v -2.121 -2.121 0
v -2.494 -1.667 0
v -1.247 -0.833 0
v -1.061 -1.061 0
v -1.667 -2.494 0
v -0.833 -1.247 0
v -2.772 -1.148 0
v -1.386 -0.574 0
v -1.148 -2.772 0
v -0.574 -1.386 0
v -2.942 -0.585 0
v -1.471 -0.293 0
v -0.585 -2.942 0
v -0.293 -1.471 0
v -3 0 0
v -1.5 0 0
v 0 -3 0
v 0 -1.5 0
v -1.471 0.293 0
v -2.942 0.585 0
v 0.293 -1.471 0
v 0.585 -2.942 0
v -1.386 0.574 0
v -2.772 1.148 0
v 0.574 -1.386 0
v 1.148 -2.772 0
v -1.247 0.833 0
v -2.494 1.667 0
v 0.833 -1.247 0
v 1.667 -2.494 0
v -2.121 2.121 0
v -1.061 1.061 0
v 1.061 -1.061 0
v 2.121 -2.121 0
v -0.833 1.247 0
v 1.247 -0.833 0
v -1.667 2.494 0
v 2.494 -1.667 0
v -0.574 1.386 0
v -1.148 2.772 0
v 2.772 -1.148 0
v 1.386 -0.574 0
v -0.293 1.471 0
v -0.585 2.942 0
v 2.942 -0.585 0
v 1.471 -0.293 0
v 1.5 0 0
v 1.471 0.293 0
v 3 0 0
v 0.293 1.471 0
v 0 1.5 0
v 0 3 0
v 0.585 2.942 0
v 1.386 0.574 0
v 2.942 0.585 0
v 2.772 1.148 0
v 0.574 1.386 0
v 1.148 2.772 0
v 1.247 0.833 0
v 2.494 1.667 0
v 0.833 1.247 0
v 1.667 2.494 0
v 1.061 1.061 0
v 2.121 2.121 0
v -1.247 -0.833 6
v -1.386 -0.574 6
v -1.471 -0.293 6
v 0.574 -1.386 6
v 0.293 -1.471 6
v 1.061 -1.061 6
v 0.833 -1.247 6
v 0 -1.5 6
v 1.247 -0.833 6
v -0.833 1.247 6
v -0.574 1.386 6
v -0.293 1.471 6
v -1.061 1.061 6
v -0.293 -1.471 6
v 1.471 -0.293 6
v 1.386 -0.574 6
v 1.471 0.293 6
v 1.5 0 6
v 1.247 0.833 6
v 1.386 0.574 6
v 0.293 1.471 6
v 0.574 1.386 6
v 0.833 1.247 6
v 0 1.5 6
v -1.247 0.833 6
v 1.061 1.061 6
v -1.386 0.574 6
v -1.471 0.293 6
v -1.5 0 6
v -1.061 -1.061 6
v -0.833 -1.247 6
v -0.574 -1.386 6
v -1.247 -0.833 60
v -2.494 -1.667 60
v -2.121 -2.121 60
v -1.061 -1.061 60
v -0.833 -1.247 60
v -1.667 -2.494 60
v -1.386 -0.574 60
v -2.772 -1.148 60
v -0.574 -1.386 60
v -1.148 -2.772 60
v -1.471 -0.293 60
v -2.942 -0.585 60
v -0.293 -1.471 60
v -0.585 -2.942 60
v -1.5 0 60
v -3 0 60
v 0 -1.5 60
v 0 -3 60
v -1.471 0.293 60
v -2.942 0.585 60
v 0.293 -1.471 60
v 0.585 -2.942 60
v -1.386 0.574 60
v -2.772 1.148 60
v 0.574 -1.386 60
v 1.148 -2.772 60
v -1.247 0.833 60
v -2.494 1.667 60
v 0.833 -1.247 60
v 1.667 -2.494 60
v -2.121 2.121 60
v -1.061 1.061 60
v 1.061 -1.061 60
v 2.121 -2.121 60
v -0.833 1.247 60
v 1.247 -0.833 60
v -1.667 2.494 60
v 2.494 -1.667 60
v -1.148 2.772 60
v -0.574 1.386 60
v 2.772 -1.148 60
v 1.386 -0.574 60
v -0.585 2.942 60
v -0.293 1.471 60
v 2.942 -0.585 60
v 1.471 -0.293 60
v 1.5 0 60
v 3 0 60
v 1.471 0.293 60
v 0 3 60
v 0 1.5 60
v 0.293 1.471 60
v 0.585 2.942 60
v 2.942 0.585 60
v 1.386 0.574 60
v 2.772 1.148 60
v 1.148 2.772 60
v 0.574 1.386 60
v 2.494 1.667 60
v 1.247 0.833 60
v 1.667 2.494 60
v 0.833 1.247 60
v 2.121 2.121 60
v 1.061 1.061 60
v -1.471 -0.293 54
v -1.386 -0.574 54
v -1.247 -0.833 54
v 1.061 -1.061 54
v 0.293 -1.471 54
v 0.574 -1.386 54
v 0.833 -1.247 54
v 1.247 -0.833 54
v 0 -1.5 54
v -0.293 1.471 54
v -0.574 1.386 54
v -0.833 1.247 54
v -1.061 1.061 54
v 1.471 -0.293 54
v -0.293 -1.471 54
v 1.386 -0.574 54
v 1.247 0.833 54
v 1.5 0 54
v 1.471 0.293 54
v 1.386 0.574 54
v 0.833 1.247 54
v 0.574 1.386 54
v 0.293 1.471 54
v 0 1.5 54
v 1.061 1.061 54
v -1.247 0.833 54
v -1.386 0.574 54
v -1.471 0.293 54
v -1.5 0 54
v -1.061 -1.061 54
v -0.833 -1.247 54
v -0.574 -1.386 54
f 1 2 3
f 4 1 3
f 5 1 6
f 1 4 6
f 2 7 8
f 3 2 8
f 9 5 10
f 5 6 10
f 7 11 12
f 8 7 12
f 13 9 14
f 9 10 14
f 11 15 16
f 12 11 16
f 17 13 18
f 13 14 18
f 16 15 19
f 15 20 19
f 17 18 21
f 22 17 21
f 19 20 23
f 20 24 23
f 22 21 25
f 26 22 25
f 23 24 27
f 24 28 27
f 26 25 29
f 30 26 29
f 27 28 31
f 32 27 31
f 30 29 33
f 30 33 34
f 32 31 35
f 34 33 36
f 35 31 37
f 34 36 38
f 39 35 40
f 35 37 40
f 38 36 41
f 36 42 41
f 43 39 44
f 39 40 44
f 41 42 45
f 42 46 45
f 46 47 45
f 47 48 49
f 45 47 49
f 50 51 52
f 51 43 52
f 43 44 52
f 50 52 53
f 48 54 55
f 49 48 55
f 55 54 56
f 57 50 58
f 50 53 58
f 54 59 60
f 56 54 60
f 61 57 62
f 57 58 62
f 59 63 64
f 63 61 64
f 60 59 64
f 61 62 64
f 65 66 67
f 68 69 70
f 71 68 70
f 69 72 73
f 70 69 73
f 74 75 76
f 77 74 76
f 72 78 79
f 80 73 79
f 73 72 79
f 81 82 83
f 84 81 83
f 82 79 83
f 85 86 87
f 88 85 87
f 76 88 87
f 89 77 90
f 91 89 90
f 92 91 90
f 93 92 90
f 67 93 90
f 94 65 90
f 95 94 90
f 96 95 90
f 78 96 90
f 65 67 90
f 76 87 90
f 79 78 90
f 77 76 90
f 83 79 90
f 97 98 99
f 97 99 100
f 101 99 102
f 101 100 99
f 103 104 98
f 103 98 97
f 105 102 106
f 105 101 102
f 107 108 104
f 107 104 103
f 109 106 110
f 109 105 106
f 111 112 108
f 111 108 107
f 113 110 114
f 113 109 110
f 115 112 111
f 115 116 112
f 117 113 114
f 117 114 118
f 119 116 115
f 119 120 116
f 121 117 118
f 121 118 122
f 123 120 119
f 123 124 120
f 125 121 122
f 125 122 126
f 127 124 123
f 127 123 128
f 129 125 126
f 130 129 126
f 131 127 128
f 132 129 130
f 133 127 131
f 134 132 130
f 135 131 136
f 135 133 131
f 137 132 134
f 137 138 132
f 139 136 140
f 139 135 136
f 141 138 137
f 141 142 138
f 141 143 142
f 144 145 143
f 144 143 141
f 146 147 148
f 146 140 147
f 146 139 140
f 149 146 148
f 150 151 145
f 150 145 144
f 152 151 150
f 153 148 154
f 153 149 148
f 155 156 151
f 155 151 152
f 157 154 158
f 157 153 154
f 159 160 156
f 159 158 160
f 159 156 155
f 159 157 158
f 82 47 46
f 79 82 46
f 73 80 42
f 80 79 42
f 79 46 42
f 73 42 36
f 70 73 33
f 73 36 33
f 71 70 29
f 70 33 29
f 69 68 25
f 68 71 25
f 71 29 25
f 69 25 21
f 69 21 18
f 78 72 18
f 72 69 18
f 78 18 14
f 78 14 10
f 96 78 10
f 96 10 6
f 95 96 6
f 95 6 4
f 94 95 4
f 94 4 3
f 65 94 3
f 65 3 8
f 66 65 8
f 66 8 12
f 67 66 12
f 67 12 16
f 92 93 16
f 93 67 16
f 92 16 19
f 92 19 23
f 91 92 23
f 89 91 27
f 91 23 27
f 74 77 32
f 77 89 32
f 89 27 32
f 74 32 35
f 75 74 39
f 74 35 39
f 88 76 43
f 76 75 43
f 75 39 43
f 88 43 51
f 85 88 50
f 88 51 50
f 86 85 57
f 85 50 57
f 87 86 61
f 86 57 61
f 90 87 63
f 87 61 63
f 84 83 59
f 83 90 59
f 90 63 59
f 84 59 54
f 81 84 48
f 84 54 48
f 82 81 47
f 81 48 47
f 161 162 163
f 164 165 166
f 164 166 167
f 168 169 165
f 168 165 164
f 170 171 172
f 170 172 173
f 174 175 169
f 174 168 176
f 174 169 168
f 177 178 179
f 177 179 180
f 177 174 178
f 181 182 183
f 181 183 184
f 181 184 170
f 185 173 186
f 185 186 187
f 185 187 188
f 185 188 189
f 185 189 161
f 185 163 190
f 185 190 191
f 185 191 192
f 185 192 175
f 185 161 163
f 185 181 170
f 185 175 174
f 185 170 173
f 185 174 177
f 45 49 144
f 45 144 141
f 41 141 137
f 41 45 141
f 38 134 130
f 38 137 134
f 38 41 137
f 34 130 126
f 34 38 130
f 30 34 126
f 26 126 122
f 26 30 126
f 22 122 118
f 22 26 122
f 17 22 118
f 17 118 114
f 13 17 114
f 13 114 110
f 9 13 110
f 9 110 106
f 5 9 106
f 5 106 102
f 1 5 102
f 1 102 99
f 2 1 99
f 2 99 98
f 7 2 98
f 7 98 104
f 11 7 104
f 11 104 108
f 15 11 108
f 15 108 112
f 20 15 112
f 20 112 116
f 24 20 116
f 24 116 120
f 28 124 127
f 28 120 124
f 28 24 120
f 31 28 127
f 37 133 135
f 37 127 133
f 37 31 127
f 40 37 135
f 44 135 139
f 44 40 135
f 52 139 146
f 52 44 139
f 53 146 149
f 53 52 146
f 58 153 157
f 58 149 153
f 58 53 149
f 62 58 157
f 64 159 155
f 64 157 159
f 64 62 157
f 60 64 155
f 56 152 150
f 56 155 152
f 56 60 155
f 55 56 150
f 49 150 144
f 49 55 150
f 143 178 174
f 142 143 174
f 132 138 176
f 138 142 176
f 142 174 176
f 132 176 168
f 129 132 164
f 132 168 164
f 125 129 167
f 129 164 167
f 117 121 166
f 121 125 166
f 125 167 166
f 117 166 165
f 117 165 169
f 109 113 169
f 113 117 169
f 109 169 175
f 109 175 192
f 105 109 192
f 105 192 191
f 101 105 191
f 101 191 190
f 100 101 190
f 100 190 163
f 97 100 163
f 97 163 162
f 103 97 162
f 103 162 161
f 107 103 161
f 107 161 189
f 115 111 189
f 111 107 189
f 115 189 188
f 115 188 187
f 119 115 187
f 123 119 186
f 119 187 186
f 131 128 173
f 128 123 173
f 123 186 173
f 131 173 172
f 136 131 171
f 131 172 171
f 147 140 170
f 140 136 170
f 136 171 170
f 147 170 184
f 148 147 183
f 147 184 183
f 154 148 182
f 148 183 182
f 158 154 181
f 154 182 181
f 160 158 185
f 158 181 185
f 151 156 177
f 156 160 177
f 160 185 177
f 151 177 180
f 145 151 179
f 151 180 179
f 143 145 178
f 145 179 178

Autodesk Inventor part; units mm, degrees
ref_plane "YZ Plane" through (0, 0, 0) normal (1, 0, 0) x (0, 1, 0)
ref_plane "XZ Plane" through (0, 0, 0) normal (0, 1, 0) x (-1, 0, 0)
sketch "スケッチ1" plane through (0, 0, 0) normal (0, 0, 1) x (1, 0, 0)
  circle A0 centre (0, 0) radius 3
  circle A1 centre (0, 0) radius 1.5
  dimension "d0" = 6
  dimension "d1" = 3
extrude "押し出し1" add sketch "スケッチ1" along normal blind 60
sketch "スケッチ2" plane through (0, 0, 60) normal (0, 0, 1) x (1, 0, 0)
  point P0 (0, 0)
ref_plane "作業平面1" through (0, 0, 54) normal (0, 0, 1) x (1, 0, 0)
sketch "スケッチ3" plane through (0, 0, 54) normal (0, 0, 1) x (1, 0, 0)
  circle A0 centre (0, 0) radius 3 projected
  circle A1 centre (0, 0) radius 1.5
  dimension "d5" = 3
extrude "押し出し2" add sketch "スケッチ3" against normal blind 48 contours A1
properties part number "スペーサーm3-60　簡易筒型　売ってない" material "アルミニウム 2014-T4"
